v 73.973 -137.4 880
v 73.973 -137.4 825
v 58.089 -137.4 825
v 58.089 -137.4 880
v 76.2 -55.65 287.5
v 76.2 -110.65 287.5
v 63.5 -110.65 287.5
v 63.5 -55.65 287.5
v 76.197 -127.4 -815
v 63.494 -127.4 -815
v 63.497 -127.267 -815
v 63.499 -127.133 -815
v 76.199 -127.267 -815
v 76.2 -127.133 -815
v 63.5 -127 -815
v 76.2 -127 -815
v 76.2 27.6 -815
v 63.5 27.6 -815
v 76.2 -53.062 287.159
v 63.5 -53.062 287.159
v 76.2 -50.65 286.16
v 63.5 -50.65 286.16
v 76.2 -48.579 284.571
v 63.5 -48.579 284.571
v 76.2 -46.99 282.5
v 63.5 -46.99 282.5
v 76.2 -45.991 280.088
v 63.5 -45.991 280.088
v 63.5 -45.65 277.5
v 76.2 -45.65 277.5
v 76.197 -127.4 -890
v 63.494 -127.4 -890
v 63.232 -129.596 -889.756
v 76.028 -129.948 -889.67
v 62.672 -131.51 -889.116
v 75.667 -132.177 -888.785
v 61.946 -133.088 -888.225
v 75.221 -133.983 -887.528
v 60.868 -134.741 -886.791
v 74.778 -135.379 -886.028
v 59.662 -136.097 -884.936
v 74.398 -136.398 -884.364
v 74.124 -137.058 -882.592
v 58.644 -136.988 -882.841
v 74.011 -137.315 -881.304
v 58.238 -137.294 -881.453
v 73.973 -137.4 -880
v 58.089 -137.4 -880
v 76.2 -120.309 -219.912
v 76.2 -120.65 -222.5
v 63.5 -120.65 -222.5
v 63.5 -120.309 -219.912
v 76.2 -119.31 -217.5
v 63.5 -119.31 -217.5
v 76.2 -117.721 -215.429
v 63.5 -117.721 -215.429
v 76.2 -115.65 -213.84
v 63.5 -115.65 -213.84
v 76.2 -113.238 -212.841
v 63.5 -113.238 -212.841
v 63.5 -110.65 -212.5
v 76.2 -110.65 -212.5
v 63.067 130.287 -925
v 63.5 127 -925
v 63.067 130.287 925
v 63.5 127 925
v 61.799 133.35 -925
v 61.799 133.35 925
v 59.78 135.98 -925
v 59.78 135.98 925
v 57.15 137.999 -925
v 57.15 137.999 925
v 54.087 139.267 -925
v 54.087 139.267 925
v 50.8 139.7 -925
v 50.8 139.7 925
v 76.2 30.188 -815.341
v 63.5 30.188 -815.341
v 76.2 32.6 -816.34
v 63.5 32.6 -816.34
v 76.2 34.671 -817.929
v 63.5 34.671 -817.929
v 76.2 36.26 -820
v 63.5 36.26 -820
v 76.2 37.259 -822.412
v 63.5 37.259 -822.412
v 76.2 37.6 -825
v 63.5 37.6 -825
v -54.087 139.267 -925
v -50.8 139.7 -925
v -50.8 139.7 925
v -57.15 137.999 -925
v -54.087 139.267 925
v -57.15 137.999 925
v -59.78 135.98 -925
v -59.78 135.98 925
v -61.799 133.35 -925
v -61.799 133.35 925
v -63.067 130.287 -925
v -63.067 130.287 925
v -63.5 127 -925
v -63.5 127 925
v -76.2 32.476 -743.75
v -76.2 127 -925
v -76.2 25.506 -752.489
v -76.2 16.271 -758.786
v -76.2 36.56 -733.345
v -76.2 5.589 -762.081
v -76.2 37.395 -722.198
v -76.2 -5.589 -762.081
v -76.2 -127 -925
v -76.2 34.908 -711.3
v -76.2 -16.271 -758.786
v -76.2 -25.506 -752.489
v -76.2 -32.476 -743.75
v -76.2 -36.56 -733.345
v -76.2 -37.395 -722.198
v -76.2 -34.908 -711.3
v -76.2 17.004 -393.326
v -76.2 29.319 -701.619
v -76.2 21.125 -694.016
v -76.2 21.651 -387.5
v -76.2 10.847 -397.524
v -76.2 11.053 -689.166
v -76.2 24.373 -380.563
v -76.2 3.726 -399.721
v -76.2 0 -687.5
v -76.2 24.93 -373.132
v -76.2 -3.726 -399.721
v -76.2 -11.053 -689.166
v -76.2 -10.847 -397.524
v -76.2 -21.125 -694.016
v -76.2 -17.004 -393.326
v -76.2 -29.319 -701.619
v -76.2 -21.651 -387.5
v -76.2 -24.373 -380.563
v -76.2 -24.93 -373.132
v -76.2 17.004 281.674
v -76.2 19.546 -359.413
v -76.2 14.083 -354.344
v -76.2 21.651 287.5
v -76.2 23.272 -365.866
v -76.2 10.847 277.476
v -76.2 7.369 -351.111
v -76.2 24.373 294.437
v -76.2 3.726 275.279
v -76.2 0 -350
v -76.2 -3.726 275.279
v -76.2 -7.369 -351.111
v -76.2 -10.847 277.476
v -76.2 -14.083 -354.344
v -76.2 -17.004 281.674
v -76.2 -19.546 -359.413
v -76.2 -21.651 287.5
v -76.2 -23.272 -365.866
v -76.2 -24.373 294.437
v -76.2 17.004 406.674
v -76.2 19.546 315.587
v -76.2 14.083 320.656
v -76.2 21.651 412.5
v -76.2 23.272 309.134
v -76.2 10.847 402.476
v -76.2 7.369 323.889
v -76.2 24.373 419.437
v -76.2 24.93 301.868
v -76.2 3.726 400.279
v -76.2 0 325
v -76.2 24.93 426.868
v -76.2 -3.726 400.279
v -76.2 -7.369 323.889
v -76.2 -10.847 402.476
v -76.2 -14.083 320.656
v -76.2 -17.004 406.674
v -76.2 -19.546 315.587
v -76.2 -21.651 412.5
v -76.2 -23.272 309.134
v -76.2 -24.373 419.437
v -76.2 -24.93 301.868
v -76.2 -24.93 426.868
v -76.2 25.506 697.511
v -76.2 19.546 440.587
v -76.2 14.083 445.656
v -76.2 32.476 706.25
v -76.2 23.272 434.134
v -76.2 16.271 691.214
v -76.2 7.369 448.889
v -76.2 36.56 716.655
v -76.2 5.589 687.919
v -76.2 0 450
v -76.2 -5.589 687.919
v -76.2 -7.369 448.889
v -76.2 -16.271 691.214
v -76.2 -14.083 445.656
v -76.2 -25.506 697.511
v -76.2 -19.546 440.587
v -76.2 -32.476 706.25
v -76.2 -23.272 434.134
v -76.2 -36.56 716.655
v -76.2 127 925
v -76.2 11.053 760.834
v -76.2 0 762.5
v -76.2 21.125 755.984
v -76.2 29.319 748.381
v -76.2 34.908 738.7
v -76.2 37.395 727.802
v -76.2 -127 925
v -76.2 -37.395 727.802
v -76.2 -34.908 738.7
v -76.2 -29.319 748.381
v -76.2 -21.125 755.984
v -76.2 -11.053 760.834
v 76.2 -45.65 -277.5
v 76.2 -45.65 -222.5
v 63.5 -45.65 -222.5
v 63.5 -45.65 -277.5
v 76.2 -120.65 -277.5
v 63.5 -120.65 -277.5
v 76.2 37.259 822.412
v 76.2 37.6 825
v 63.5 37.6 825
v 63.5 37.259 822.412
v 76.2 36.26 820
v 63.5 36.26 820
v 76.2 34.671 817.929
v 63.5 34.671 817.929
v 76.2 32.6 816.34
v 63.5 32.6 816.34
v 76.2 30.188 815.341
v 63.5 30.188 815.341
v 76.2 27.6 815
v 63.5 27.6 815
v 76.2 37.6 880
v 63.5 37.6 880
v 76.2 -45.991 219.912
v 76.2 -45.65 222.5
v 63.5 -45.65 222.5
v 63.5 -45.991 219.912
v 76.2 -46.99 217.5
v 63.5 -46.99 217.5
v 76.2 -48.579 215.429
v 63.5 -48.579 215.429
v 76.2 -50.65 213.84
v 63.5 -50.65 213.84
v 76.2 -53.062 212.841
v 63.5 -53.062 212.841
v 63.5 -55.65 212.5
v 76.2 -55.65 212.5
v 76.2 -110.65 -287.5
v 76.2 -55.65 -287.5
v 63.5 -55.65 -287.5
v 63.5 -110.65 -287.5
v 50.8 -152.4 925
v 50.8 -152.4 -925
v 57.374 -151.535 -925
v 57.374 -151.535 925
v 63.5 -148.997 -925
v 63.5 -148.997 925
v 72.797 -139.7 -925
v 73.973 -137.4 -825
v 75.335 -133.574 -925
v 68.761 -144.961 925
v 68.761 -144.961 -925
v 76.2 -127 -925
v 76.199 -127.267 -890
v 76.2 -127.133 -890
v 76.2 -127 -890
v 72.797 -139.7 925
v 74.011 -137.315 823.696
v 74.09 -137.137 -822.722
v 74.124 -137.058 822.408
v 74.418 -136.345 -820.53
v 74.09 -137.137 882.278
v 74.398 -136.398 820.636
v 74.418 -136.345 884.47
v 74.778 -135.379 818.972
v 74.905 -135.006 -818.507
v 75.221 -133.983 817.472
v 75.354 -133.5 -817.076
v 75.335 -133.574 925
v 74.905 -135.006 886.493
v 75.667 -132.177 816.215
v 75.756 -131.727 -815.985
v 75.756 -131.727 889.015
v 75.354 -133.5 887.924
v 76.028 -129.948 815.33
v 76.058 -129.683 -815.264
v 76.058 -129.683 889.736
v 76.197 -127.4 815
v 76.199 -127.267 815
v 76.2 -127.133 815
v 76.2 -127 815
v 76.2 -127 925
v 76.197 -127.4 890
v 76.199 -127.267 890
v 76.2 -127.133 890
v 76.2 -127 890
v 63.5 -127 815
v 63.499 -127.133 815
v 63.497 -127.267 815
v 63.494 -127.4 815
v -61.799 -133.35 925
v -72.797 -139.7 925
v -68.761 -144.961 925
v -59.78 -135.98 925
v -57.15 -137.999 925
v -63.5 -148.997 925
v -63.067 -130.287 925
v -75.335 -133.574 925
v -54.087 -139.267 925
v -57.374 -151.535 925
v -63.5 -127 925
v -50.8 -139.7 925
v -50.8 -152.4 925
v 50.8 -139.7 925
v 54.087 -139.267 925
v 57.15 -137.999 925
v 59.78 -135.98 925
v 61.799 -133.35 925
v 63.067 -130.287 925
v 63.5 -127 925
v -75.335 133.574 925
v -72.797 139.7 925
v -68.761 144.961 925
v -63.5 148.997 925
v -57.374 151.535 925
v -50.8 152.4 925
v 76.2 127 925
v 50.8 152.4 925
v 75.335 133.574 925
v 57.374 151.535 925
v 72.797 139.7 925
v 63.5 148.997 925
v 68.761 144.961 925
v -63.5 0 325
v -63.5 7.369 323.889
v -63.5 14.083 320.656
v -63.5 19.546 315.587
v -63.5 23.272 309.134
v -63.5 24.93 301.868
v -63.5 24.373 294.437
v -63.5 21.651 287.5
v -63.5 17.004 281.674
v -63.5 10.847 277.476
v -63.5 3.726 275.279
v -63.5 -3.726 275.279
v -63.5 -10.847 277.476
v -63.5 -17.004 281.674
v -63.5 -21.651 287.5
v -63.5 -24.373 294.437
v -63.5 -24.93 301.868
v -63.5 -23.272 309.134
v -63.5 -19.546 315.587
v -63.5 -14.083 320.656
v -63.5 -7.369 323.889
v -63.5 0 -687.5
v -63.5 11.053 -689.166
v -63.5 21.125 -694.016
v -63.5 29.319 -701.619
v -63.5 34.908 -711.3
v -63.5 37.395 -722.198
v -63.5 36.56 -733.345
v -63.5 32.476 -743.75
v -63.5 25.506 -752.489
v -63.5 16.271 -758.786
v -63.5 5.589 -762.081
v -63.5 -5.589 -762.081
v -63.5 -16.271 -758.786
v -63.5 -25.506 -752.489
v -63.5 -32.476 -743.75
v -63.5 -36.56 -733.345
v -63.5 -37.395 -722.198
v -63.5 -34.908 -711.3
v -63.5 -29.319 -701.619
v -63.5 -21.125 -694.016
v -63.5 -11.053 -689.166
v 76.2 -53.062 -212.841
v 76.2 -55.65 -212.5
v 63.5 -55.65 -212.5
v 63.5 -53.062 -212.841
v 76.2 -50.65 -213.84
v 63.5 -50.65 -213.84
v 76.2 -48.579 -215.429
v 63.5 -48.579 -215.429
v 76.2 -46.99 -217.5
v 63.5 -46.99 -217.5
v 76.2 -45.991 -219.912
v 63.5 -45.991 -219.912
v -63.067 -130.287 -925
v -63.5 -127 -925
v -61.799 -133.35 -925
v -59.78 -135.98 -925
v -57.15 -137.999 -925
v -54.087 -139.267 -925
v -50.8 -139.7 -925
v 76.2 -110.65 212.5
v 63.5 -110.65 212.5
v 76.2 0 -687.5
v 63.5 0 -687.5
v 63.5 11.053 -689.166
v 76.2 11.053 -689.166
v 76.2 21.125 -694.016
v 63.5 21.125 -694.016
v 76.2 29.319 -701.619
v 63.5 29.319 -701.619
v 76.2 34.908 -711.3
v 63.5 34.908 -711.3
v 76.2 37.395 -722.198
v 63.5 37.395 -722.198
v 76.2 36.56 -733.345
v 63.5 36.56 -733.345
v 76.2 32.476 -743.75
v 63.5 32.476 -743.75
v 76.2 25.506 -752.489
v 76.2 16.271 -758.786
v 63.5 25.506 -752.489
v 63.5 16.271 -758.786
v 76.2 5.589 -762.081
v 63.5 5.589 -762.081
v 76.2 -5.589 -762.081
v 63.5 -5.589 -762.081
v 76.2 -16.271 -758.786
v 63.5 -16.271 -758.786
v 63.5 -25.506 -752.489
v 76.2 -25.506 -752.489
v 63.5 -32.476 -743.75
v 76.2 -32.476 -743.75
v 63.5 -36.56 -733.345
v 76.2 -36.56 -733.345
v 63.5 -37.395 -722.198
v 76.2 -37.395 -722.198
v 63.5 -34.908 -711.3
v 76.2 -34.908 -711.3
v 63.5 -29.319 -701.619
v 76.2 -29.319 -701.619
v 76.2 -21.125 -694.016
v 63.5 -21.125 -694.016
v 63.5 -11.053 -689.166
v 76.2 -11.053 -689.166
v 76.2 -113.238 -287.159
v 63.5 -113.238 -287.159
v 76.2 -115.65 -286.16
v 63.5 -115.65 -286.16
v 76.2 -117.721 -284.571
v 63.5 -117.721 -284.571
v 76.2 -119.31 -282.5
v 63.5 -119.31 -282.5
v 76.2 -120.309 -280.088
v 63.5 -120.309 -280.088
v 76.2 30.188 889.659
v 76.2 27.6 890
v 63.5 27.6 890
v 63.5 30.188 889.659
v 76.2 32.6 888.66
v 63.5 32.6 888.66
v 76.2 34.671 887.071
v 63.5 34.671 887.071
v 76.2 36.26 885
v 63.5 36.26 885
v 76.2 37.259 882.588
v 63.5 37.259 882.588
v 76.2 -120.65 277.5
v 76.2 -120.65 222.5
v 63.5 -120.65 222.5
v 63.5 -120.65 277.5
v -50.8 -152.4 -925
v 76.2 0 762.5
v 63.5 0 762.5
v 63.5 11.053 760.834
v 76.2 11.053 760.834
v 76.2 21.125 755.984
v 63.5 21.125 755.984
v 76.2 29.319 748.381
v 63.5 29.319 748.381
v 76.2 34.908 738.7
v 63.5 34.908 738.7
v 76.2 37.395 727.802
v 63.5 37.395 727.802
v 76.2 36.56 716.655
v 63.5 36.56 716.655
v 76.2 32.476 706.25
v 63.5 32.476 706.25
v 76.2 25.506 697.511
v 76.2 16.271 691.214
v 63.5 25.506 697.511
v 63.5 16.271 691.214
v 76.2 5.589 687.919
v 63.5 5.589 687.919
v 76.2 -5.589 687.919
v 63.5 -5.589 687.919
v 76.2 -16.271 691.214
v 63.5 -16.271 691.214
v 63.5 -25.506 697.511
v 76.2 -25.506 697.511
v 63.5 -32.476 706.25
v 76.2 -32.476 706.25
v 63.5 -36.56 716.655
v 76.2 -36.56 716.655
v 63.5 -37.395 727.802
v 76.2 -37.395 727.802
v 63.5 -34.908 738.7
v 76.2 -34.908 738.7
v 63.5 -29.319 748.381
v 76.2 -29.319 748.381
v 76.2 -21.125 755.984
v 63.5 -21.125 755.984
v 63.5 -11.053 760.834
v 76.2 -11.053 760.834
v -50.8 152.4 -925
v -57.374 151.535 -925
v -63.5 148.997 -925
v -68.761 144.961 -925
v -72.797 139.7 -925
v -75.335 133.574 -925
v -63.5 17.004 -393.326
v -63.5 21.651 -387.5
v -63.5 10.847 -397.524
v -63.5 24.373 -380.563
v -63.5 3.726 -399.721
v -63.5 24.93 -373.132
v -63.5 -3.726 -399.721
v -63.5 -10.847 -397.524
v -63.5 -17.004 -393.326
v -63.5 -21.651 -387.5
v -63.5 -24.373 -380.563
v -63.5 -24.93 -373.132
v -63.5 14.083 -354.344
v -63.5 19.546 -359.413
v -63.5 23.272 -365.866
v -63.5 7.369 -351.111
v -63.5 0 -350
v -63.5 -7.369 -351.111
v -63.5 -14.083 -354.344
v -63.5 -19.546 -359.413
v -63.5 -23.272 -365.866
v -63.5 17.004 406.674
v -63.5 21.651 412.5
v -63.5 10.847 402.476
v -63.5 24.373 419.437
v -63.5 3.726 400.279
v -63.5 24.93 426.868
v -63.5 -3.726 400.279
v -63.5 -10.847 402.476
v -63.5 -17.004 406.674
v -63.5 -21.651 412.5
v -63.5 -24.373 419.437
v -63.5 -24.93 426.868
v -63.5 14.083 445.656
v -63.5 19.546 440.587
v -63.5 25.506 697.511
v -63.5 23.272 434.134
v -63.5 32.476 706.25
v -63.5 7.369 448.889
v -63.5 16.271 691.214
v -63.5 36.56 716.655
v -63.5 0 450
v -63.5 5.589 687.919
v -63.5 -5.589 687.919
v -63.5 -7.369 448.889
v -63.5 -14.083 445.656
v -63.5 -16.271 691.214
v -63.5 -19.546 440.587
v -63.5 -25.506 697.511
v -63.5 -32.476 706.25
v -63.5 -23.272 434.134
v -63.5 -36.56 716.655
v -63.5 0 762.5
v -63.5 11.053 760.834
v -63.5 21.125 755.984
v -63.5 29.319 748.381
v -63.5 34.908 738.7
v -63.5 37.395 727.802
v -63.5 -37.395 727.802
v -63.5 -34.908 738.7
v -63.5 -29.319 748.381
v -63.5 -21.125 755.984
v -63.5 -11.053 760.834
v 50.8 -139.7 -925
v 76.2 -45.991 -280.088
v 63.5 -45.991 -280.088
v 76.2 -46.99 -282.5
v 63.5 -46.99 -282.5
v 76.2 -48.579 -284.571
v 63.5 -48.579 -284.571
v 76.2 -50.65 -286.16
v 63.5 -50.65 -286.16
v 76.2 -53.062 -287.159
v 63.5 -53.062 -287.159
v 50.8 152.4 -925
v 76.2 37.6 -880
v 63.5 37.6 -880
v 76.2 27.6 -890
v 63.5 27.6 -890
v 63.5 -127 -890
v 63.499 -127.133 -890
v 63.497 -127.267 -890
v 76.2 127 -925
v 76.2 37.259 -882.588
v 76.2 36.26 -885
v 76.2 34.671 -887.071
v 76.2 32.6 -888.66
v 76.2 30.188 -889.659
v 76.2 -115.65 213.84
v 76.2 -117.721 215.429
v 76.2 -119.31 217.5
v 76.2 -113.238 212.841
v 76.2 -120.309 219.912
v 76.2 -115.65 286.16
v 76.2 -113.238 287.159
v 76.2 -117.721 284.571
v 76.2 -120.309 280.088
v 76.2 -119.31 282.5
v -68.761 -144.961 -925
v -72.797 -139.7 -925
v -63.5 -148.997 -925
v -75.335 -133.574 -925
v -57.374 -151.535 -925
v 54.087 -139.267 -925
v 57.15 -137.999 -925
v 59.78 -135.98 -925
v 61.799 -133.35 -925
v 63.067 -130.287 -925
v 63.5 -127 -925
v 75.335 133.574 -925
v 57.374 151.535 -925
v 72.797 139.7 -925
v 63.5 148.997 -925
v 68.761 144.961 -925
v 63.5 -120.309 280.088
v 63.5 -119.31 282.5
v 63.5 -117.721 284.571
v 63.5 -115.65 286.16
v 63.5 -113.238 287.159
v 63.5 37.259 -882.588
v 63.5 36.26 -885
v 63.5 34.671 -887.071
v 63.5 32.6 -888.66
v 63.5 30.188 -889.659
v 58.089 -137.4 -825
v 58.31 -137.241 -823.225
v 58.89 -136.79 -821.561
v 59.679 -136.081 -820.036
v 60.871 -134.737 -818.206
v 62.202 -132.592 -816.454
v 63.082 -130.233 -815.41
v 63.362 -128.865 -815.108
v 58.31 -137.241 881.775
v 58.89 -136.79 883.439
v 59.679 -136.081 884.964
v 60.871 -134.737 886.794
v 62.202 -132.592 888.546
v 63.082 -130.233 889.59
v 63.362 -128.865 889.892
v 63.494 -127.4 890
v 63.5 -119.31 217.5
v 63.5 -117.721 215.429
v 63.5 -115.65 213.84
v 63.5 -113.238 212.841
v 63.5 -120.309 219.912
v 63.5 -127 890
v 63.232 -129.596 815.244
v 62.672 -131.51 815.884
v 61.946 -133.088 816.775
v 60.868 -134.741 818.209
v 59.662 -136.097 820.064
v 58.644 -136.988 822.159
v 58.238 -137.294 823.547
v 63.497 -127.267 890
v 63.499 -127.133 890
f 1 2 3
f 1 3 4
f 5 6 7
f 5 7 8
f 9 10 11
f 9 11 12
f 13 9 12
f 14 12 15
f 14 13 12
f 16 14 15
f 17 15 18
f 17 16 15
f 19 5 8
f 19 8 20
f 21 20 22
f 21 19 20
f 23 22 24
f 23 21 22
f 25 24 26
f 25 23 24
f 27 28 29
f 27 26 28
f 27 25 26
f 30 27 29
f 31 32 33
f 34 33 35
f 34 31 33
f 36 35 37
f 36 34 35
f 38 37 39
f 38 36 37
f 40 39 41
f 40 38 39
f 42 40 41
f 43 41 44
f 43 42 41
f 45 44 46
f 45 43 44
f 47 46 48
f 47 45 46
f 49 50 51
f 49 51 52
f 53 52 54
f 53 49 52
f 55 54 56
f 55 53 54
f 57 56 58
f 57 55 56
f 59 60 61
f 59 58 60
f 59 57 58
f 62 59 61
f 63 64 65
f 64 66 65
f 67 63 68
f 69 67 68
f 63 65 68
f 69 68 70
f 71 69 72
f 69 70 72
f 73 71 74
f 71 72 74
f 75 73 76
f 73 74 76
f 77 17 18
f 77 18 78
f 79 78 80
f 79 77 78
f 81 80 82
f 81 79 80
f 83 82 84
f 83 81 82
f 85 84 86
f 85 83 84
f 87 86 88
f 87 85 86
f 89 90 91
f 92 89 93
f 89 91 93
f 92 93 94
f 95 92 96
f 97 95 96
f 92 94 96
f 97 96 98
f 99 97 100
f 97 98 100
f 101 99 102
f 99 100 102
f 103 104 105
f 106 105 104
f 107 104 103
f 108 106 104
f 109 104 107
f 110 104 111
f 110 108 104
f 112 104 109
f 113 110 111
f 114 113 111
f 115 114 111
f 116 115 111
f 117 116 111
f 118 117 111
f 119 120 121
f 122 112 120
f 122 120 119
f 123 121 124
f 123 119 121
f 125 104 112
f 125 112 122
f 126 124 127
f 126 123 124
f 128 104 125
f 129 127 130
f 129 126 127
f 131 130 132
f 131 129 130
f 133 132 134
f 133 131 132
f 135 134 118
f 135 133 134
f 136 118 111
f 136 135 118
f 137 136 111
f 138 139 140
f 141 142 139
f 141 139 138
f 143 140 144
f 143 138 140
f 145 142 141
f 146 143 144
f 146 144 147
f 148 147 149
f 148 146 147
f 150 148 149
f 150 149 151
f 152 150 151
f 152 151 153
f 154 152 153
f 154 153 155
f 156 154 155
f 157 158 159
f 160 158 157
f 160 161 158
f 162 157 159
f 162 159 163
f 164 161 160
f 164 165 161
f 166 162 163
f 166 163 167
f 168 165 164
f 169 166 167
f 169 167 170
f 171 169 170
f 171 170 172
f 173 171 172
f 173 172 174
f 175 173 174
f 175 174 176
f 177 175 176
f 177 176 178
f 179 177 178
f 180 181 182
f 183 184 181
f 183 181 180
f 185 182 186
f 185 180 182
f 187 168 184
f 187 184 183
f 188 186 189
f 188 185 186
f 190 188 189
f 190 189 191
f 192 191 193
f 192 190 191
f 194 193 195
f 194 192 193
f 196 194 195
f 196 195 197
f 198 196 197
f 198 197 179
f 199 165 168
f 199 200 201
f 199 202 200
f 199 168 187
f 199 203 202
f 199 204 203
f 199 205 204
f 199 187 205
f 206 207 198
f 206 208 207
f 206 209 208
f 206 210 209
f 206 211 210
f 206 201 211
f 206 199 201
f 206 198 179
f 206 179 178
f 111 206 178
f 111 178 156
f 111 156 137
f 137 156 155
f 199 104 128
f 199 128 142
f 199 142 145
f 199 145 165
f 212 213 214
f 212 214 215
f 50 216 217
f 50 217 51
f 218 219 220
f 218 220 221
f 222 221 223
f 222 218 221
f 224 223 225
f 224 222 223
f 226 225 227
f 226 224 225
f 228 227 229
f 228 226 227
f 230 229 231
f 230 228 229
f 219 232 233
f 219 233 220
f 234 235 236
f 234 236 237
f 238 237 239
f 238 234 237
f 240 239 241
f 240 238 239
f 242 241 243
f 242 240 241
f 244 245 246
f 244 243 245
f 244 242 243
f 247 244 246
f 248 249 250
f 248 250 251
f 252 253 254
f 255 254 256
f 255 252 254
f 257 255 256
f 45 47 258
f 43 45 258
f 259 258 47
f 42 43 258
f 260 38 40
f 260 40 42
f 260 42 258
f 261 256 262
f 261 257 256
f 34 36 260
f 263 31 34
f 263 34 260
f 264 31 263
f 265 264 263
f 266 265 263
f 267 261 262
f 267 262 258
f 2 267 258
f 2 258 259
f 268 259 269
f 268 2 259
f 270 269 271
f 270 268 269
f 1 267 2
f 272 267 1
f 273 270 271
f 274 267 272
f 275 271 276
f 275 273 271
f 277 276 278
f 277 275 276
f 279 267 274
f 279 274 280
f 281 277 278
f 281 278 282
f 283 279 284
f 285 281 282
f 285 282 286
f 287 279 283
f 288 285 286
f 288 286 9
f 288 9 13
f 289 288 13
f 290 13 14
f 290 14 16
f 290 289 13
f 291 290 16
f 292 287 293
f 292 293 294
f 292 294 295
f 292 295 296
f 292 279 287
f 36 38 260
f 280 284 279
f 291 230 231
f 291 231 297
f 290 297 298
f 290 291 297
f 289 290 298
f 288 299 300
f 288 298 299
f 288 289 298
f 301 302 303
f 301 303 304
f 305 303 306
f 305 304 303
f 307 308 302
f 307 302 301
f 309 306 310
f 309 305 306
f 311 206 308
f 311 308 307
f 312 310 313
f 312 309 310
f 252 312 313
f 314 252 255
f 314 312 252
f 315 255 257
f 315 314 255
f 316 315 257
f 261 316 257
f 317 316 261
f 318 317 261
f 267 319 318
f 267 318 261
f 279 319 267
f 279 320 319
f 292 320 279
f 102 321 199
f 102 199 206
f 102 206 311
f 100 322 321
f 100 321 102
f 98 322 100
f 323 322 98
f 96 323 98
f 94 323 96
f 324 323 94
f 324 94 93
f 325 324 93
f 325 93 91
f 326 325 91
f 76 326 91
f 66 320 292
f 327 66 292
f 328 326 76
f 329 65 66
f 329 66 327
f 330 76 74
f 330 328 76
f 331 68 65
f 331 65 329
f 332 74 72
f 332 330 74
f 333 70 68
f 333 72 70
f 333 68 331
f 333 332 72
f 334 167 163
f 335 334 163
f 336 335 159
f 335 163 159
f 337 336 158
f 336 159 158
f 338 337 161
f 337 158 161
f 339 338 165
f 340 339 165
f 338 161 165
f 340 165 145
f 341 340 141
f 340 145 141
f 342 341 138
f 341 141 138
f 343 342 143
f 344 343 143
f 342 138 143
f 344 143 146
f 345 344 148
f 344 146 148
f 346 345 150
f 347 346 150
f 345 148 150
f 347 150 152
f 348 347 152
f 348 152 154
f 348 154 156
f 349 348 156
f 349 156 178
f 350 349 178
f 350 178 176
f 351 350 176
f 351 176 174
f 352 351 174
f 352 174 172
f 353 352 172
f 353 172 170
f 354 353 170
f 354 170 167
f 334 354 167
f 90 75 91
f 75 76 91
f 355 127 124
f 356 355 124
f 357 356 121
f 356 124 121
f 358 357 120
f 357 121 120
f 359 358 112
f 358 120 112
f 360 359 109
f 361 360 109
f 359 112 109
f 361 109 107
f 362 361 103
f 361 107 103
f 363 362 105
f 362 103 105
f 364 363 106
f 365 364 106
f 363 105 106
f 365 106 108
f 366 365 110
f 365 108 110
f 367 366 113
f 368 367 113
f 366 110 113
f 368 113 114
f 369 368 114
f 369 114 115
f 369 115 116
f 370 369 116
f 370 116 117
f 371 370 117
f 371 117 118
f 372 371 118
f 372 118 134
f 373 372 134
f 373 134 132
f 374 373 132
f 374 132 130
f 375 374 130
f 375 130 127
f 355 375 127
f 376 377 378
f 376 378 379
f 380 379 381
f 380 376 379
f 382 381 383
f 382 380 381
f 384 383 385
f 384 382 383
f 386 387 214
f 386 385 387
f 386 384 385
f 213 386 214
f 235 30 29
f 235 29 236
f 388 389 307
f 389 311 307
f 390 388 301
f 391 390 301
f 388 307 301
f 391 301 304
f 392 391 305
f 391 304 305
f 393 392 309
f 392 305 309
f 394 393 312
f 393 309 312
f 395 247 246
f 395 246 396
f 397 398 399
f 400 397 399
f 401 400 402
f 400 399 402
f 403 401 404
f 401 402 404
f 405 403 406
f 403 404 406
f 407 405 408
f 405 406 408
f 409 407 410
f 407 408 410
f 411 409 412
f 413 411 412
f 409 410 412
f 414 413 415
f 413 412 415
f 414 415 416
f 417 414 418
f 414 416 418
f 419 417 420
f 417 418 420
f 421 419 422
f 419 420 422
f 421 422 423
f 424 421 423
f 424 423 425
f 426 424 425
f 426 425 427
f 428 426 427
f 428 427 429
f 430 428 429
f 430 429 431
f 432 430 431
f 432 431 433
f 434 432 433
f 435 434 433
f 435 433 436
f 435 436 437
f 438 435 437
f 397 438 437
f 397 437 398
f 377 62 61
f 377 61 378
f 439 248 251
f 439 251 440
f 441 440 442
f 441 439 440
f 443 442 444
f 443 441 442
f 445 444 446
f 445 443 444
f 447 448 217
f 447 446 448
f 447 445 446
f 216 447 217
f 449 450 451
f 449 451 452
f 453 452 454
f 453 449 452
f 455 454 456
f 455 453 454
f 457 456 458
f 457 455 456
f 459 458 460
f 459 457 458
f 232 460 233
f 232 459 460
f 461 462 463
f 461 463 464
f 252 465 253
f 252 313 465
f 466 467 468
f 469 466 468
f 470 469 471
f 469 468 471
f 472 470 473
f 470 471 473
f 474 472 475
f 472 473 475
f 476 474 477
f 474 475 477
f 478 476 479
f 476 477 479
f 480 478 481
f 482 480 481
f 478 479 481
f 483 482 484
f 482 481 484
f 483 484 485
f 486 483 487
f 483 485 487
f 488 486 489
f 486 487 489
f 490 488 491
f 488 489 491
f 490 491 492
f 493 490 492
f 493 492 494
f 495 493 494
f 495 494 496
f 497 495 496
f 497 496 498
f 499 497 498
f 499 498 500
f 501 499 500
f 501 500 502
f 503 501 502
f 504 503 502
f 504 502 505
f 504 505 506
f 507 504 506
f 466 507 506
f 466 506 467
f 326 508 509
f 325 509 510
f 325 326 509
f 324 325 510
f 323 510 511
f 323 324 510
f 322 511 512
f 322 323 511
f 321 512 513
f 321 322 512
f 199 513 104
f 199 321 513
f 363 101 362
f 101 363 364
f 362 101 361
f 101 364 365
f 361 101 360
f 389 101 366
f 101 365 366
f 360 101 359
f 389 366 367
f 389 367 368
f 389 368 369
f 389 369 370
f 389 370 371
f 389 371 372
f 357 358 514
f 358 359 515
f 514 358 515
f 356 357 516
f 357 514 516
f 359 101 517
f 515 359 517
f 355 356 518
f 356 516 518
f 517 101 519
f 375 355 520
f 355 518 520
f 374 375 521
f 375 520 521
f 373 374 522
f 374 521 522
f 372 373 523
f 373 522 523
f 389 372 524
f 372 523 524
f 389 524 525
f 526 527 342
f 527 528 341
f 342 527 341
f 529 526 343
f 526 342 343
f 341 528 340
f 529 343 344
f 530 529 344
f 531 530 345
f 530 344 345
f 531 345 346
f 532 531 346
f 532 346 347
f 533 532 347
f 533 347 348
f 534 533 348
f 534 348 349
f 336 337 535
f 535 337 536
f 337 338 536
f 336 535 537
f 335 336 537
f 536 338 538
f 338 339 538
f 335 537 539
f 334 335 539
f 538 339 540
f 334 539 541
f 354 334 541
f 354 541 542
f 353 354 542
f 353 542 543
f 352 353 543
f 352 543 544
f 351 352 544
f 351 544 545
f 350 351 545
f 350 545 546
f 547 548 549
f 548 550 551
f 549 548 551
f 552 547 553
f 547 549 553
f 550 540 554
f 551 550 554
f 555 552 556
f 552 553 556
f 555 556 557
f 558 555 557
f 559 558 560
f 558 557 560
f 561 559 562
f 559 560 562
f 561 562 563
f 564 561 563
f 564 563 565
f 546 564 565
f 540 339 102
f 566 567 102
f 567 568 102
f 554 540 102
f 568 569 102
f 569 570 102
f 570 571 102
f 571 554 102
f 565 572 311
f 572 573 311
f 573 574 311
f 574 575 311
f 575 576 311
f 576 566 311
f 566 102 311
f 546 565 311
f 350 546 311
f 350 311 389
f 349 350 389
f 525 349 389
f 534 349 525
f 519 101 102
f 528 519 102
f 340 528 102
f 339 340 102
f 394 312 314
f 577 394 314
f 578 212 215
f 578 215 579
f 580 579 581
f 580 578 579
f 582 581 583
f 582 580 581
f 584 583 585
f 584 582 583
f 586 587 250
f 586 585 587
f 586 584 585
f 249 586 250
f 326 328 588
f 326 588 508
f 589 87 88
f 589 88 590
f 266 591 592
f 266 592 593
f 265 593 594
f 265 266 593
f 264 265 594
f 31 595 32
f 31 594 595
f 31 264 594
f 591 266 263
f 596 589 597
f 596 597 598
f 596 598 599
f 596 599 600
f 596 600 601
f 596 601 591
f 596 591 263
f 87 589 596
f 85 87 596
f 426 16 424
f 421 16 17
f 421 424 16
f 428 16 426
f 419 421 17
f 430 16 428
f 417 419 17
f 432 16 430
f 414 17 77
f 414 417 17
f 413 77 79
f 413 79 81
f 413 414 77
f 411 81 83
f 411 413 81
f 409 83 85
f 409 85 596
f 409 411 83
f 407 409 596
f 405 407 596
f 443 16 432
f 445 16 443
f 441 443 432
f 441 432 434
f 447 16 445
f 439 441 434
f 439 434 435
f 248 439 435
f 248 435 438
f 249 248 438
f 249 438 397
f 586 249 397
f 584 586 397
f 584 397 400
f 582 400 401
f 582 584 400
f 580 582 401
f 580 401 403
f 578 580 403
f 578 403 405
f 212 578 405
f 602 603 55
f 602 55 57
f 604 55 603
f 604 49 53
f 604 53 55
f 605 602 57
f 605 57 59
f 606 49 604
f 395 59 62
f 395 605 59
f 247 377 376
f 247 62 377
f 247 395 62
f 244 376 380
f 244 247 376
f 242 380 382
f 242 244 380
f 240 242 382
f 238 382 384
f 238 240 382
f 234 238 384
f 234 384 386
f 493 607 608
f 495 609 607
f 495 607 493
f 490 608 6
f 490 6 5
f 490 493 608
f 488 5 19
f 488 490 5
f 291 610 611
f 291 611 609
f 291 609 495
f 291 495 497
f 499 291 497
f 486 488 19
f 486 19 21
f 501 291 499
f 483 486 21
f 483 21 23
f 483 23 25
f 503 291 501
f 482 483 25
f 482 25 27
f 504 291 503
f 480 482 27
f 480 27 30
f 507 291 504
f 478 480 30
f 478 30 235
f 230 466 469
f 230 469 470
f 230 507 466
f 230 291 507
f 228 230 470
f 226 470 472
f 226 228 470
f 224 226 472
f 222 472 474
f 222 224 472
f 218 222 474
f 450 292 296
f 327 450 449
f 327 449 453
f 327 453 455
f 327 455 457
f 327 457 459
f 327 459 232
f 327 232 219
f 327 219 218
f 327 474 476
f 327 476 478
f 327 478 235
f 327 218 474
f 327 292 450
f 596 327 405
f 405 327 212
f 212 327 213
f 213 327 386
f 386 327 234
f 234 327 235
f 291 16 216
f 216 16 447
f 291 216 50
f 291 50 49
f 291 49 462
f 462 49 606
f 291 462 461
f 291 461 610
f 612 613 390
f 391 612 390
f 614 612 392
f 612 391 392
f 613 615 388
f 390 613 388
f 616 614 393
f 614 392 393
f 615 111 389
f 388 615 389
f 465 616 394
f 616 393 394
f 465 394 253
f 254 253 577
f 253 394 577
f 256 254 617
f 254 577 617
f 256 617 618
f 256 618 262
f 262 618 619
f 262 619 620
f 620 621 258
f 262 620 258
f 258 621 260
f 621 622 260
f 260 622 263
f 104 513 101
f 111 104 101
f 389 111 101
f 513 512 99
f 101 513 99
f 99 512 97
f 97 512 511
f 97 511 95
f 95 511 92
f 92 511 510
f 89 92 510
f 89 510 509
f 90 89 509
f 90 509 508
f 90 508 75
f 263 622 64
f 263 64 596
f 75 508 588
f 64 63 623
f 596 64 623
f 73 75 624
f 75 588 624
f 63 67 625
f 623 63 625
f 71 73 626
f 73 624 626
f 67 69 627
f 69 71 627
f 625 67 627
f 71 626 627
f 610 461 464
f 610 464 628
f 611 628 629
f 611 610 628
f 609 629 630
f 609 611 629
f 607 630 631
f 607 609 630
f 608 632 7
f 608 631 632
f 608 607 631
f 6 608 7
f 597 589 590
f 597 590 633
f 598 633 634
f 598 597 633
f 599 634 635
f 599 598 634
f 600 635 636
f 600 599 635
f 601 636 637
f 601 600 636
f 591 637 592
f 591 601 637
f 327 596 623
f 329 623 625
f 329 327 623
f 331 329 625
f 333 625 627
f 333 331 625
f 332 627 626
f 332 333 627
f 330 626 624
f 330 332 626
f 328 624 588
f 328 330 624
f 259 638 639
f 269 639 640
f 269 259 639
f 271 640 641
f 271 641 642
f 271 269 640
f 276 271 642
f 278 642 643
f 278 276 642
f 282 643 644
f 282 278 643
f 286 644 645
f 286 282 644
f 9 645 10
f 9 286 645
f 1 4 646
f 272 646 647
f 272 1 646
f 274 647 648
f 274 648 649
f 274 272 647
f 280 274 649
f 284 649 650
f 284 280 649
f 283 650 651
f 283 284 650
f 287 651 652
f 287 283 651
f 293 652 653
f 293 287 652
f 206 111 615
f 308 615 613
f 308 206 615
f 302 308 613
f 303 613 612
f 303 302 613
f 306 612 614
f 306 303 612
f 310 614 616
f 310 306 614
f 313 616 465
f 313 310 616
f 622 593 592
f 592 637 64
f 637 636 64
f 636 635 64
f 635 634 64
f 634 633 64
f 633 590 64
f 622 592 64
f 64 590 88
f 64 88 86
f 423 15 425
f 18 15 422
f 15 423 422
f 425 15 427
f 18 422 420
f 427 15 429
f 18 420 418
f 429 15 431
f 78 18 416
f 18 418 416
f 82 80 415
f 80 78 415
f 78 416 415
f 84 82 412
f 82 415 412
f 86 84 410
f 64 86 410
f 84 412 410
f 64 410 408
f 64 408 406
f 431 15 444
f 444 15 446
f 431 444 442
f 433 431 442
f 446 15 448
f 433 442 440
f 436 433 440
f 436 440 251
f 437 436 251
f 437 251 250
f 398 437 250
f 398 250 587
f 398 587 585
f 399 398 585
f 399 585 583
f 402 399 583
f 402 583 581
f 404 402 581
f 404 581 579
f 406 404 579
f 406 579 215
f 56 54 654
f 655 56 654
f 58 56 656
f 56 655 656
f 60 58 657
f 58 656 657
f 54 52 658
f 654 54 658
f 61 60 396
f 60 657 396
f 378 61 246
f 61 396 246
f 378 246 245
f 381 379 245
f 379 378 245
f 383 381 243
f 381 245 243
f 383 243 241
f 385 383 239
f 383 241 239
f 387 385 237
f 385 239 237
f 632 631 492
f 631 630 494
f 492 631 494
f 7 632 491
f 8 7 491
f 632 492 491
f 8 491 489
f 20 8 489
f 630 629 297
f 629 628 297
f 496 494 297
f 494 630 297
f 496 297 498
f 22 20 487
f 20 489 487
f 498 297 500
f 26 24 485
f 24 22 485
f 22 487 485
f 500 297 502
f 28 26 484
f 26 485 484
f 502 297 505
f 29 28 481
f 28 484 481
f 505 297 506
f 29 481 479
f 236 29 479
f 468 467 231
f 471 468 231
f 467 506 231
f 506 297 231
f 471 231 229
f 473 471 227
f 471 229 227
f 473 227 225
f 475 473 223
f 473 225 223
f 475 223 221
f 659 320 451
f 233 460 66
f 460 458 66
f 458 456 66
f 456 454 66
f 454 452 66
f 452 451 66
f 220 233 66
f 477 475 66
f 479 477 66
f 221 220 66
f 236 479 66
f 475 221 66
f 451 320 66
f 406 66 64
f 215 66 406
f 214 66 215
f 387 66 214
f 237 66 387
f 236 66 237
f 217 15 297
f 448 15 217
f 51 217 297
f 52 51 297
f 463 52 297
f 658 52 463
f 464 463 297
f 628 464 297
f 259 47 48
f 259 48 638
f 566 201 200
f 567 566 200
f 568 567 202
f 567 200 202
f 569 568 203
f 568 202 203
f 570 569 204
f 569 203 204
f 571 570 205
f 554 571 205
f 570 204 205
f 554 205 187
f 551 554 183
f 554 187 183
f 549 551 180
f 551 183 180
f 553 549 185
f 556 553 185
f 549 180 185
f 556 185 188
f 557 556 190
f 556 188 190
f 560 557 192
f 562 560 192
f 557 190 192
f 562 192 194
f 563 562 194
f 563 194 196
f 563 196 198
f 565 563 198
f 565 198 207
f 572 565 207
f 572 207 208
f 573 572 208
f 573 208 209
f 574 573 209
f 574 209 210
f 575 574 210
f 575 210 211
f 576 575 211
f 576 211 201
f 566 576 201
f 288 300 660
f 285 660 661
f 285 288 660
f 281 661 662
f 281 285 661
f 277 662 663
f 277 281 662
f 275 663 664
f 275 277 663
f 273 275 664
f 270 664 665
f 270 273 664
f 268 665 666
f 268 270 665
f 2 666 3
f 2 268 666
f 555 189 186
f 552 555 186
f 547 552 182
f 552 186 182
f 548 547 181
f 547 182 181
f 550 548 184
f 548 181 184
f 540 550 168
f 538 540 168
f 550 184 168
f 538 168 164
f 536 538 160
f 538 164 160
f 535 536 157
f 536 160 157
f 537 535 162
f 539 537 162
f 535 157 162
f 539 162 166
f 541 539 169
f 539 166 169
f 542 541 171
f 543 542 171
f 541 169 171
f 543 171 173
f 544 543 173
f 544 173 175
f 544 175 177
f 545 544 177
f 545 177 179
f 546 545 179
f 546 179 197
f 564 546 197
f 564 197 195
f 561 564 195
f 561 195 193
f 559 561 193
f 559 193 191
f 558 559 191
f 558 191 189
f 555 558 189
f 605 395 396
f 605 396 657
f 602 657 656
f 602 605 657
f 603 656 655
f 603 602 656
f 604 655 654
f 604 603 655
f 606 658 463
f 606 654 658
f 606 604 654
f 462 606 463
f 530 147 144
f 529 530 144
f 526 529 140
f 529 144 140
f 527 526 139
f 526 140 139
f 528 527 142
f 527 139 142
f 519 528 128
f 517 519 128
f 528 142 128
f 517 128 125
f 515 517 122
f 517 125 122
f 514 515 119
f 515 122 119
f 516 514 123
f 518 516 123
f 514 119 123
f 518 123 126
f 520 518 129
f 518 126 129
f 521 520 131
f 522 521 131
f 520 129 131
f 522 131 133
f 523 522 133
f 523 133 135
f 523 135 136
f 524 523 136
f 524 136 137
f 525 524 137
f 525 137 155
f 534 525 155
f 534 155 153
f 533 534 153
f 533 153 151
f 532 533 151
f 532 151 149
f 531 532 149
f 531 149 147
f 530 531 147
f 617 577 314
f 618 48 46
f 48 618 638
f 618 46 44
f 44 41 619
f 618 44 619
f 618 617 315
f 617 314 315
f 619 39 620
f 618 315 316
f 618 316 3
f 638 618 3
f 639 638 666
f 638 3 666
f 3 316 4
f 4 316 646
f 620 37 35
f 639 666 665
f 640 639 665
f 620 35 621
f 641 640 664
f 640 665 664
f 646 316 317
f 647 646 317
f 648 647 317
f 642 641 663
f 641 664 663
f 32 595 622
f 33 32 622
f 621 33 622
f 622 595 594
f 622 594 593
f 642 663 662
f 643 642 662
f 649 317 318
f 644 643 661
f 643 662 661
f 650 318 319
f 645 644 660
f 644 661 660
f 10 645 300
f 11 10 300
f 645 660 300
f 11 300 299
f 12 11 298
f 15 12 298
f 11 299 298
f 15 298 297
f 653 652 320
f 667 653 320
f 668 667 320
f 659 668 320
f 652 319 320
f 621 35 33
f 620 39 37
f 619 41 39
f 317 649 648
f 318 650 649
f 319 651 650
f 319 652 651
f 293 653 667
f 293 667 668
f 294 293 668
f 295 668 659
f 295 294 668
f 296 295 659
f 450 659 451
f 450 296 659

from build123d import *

# Parameters (mm, degrees)
BOSS_EXTRUDE1_DEPTH                       = 925
CUT_EXTRUDE1_DEPTH                        = 30
FOR_MACH_SHOP_CONFIRM_W_PROGRAMMING_REACH = 951.777
SKETCH5_R                                 = 37.5
CUT_EXTRUDE3_DEPTH                        = 950.777089767
CUT_EXTRUDE4_REACH                        = 951.777
SKETCH6_R                                 = 25


with BuildPart() as part:
    # Sketch1 → Boss-Extrude1 (new, symmetric)
    with BuildSketch(Plane.XY):
        with BuildLine():
            Line((-50.8, -152.4), (50.8, -152.4))
            ThreePointArc((50.8, -152.4), (68.760512242, -144.960512242), (76.2, -127))
            Line((76.2, -127), (76.2, 127))
            ThreePointArc((76.2, 127), (68.760512242, 144.960512242), (50.8, 152.4))
            Line((50.8, 152.4), (-50.8, 152.4))
            ThreePointArc((-50.8, 152.4), (-68.760512242, 144.960512242), (-76.2, 127))
            Line((-76.2, 127), (-76.2, -127))
            ThreePointArc((-76.2, -127), (-68.760512242, -144.960512242), (-50.8, -152.4))
        make_face()
        with BuildLine():
            Line((-50.8, -139.7), (50.8, -139.7))
            ThreePointArc((50.8, -139.7), (59.780256121, -135.980256121), (63.5, -127))
            Line((63.5, -127), (63.5, 127))
            ThreePointArc((63.5, 127), (59.780256121, 135.980256121), (50.8, 139.7))
            Line((50.8, 139.7), (-50.8, 139.7))
            ThreePointArc((-50.8, 139.7), (-59.780256121, 135.980256121), (-63.5, 127))
            Line((-63.5, 127), (-63.5, -127))
            ThreePointArc((-63.5, -127), (-59.780256121, -135.980256121), (-50.8, -139.7))
        make_face(mode=Mode.SUBTRACT)
    extrude(amount=BOSS_EXTRUDE1_DEPTH, both=True)

    # Sketch2 → Cut-Extrude1 (cut)
    with BuildSketch(Plane(origin=(76.2, 0, 0), x_dir=(0, 0, -1), z_dir=(1, 0, 0))):
        with BuildLine():
            Line((-880, 37.6), (-825, 37.6))
            ThreePointArc((-825, 37.6), (-817.928932188, 34.671067812), (-815, 27.6))
            Line((-815, 27.6), (-815, -127.4))
            ThreePointArc((-815, -127.4), (-817.928932188, -134.471067812), (-825, -137.4))
            Line((-825, -137.4), (-880, -137.4))
            ThreePointArc((-880, -137.4), (-887.071067812, -134.471067812), (-890, -127.4))
            Line((-890, -127.4), (-890, 27.6))
            ThreePointArc((-890, 27.6), (-887.071067812, 34.671067812), (-880, 37.6))
        make_face()
        with BuildLine():
            Line((825, 37.6), (880, 37.6))
            ThreePointArc((880, 37.6), (887.071067812, 34.671067812), (890, 27.6))
            Line((890, 27.6), (890, -127.4))
            ThreePointArc((890, -127.4), (887.071067812, -134.471067812), (880, -137.4))
            Line((880, -137.4), (825, -137.4))
            ThreePointArc((825, -137.4), (817.928932188, -134.471067812), (815, -127.4))
            Line((815, -127.4), (815, 27.6))
            ThreePointArc((815, 27.6), (817.928932188, 34.671067812), (825, 37.6))
        make_face()
    extrude(amount=-CUT_EXTRUDE1_DEPTH, mode=Mode.SUBTRACT)

    # Sketch3 → for mach shop confirm w/ programming (cut, up to next)
    with BuildSketch(Plane(origin=(76.2, 0, 0), x_dir=(0, 0, -1), z_dir=(1, 0, 0)), mode=Mode.PRIVATE) as for_mach_shop_confirm_w_programming_sk1:
        with BuildLine():
            Line((-277.5, -45.65), (-222.5, -45.65))
            ThreePointArc((-222.5, -45.65), (-215.428932188, -48.578932188), (-212.5, -55.65))
            Line((-212.5, -55.65), (-212.5, -110.65))
            ThreePointArc((-212.5, -110.65), (-215.428932188, -117.721067812), (-222.5, -120.65))
            Line((-222.5, -120.65), (-277.5, -120.65))
            ThreePointArc((-277.5, -120.65), (-284.571067812, -117.721067812), (-287.5, -110.65))
            Line((-287.5, -110.65), (-287.5, -55.65))
            ThreePointArc((-287.5, -55.65), (-284.571067812, -48.578932188), (-277.5, -45.65))
        make_face()
    for_mach_shop_confirm_w_programming_tool1 = extrude(for_mach_shop_confirm_w_programming_sk1.sketch, amount=-FOR_MACH_SHOP_CONFIRM_W_PROGRAMMING_REACH, mode=Mode.PRIVATE) & part.part
    # Sketch3 → for mach shop confirm w/ programming (cut, up to next)
    with BuildSketch(Plane(origin=(76.2, 0, 0), x_dir=(0, 0, -1), z_dir=(1, 0, 0)), mode=Mode.PRIVATE) as for_mach_shop_confirm_w_programming_sk2:
        with BuildLine():
            Line((222.5, -45.65), (277.5, -45.65))
            ThreePointArc((277.5, -45.65), (284.571067812, -48.578932188), (287.5, -55.65))
            Line((287.5, -55.65), (287.5, -110.65))
            ThreePointArc((287.5, -110.65), (284.571067812, -117.721067812), (277.5, -120.65))
            Line((277.5, -120.65), (222.5, -120.65))
            ThreePointArc((222.5, -120.65), (215.428932188, -117.721067812), (212.5, -110.65))
            Line((212.5, -110.65), (212.5, -55.65))
            ThreePointArc((212.5, -55.65), (215.428932188, -48.578932188), (222.5, -45.65))
        make_face()
    for_mach_shop_confirm_w_programming_tool2 = extrude(for_mach_shop_confirm_w_programming_sk2.sketch, amount=-FOR_MACH_SHOP_CONFIRM_W_PROGRAMMING_REACH, mode=Mode.PRIVATE) & part.part
    add(for_mach_shop_confirm_w_programming_tool1.solids().sort_by_distance((76.2, -83.15, 250))[0], mode=Mode.SUBTRACT)
    add(for_mach_shop_confirm_w_programming_tool2.solids().sort_by_distance((76.2, -83.15, -250))[0], mode=Mode.SUBTRACT)

    # Sketch5 → Cut-Extrude3 (cut, through all)
    with BuildSketch(Plane.ZY.offset(76.2)):
        with Locations((725, 0)):
            Circle(SKETCH5_R)
        with Locations((-725, 0)):
            Circle(SKETCH5_R)
    extrude(amount=-CUT_EXTRUDE3_DEPTH, mode=Mode.SUBTRACT)

    # Sketch6 → Cut-Extrude4 (cut, up to next)
    with BuildSketch(Plane.ZY.offset(76.2), mode=Mode.PRIVATE) as cut_extrude4_sk1:
        with Locations((-375, 0)):
            Circle(SKETCH6_R)
    cut_extrude4_tool1 = extrude(cut_extrude4_sk1.sketch, amount=-CUT_EXTRUDE4_REACH, mode=Mode.PRIVATE) & part.part
    # Sketch6 → Cut-Extrude4 (cut, up to next)
    with BuildSketch(Plane.ZY.offset(76.2), mode=Mode.PRIVATE) as cut_extrude4_sk2:
        with Locations((300, 0)):
            Circle(SKETCH6_R)
    cut_extrude4_tool2 = extrude(cut_extrude4_sk2.sketch, amount=-CUT_EXTRUDE4_REACH, mode=Mode.PRIVATE) & part.part
    # Sketch6 → Cut-Extrude4 (cut, up to next)
    with BuildSketch(Plane.ZY.offset(76.2), mode=Mode.PRIVATE) as cut_extrude4_sk3:
        with Locations((425, 0)):
            Circle(SKETCH6_R)
    cut_extrude4_tool3 = extrude(cut_extrude4_sk3.sketch, amount=-CUT_EXTRUDE4_REACH, mode=Mode.PRIVATE) & part.part
    add(cut_extrude4_tool1.solids().sort_by_distance((-76.2, 0, -375))[0], mode=Mode.SUBTRACT)
    add(cut_extrude4_tool2.solids().sort_by_distance((-76.2, 0, 300))[0], mode=Mode.SUBTRACT)
    add(cut_extrude4_tool3.solids().sort_by_distance((-76.2, 0, 425))[0], mode=Mode.SUBTRACT)


solid = part.part
